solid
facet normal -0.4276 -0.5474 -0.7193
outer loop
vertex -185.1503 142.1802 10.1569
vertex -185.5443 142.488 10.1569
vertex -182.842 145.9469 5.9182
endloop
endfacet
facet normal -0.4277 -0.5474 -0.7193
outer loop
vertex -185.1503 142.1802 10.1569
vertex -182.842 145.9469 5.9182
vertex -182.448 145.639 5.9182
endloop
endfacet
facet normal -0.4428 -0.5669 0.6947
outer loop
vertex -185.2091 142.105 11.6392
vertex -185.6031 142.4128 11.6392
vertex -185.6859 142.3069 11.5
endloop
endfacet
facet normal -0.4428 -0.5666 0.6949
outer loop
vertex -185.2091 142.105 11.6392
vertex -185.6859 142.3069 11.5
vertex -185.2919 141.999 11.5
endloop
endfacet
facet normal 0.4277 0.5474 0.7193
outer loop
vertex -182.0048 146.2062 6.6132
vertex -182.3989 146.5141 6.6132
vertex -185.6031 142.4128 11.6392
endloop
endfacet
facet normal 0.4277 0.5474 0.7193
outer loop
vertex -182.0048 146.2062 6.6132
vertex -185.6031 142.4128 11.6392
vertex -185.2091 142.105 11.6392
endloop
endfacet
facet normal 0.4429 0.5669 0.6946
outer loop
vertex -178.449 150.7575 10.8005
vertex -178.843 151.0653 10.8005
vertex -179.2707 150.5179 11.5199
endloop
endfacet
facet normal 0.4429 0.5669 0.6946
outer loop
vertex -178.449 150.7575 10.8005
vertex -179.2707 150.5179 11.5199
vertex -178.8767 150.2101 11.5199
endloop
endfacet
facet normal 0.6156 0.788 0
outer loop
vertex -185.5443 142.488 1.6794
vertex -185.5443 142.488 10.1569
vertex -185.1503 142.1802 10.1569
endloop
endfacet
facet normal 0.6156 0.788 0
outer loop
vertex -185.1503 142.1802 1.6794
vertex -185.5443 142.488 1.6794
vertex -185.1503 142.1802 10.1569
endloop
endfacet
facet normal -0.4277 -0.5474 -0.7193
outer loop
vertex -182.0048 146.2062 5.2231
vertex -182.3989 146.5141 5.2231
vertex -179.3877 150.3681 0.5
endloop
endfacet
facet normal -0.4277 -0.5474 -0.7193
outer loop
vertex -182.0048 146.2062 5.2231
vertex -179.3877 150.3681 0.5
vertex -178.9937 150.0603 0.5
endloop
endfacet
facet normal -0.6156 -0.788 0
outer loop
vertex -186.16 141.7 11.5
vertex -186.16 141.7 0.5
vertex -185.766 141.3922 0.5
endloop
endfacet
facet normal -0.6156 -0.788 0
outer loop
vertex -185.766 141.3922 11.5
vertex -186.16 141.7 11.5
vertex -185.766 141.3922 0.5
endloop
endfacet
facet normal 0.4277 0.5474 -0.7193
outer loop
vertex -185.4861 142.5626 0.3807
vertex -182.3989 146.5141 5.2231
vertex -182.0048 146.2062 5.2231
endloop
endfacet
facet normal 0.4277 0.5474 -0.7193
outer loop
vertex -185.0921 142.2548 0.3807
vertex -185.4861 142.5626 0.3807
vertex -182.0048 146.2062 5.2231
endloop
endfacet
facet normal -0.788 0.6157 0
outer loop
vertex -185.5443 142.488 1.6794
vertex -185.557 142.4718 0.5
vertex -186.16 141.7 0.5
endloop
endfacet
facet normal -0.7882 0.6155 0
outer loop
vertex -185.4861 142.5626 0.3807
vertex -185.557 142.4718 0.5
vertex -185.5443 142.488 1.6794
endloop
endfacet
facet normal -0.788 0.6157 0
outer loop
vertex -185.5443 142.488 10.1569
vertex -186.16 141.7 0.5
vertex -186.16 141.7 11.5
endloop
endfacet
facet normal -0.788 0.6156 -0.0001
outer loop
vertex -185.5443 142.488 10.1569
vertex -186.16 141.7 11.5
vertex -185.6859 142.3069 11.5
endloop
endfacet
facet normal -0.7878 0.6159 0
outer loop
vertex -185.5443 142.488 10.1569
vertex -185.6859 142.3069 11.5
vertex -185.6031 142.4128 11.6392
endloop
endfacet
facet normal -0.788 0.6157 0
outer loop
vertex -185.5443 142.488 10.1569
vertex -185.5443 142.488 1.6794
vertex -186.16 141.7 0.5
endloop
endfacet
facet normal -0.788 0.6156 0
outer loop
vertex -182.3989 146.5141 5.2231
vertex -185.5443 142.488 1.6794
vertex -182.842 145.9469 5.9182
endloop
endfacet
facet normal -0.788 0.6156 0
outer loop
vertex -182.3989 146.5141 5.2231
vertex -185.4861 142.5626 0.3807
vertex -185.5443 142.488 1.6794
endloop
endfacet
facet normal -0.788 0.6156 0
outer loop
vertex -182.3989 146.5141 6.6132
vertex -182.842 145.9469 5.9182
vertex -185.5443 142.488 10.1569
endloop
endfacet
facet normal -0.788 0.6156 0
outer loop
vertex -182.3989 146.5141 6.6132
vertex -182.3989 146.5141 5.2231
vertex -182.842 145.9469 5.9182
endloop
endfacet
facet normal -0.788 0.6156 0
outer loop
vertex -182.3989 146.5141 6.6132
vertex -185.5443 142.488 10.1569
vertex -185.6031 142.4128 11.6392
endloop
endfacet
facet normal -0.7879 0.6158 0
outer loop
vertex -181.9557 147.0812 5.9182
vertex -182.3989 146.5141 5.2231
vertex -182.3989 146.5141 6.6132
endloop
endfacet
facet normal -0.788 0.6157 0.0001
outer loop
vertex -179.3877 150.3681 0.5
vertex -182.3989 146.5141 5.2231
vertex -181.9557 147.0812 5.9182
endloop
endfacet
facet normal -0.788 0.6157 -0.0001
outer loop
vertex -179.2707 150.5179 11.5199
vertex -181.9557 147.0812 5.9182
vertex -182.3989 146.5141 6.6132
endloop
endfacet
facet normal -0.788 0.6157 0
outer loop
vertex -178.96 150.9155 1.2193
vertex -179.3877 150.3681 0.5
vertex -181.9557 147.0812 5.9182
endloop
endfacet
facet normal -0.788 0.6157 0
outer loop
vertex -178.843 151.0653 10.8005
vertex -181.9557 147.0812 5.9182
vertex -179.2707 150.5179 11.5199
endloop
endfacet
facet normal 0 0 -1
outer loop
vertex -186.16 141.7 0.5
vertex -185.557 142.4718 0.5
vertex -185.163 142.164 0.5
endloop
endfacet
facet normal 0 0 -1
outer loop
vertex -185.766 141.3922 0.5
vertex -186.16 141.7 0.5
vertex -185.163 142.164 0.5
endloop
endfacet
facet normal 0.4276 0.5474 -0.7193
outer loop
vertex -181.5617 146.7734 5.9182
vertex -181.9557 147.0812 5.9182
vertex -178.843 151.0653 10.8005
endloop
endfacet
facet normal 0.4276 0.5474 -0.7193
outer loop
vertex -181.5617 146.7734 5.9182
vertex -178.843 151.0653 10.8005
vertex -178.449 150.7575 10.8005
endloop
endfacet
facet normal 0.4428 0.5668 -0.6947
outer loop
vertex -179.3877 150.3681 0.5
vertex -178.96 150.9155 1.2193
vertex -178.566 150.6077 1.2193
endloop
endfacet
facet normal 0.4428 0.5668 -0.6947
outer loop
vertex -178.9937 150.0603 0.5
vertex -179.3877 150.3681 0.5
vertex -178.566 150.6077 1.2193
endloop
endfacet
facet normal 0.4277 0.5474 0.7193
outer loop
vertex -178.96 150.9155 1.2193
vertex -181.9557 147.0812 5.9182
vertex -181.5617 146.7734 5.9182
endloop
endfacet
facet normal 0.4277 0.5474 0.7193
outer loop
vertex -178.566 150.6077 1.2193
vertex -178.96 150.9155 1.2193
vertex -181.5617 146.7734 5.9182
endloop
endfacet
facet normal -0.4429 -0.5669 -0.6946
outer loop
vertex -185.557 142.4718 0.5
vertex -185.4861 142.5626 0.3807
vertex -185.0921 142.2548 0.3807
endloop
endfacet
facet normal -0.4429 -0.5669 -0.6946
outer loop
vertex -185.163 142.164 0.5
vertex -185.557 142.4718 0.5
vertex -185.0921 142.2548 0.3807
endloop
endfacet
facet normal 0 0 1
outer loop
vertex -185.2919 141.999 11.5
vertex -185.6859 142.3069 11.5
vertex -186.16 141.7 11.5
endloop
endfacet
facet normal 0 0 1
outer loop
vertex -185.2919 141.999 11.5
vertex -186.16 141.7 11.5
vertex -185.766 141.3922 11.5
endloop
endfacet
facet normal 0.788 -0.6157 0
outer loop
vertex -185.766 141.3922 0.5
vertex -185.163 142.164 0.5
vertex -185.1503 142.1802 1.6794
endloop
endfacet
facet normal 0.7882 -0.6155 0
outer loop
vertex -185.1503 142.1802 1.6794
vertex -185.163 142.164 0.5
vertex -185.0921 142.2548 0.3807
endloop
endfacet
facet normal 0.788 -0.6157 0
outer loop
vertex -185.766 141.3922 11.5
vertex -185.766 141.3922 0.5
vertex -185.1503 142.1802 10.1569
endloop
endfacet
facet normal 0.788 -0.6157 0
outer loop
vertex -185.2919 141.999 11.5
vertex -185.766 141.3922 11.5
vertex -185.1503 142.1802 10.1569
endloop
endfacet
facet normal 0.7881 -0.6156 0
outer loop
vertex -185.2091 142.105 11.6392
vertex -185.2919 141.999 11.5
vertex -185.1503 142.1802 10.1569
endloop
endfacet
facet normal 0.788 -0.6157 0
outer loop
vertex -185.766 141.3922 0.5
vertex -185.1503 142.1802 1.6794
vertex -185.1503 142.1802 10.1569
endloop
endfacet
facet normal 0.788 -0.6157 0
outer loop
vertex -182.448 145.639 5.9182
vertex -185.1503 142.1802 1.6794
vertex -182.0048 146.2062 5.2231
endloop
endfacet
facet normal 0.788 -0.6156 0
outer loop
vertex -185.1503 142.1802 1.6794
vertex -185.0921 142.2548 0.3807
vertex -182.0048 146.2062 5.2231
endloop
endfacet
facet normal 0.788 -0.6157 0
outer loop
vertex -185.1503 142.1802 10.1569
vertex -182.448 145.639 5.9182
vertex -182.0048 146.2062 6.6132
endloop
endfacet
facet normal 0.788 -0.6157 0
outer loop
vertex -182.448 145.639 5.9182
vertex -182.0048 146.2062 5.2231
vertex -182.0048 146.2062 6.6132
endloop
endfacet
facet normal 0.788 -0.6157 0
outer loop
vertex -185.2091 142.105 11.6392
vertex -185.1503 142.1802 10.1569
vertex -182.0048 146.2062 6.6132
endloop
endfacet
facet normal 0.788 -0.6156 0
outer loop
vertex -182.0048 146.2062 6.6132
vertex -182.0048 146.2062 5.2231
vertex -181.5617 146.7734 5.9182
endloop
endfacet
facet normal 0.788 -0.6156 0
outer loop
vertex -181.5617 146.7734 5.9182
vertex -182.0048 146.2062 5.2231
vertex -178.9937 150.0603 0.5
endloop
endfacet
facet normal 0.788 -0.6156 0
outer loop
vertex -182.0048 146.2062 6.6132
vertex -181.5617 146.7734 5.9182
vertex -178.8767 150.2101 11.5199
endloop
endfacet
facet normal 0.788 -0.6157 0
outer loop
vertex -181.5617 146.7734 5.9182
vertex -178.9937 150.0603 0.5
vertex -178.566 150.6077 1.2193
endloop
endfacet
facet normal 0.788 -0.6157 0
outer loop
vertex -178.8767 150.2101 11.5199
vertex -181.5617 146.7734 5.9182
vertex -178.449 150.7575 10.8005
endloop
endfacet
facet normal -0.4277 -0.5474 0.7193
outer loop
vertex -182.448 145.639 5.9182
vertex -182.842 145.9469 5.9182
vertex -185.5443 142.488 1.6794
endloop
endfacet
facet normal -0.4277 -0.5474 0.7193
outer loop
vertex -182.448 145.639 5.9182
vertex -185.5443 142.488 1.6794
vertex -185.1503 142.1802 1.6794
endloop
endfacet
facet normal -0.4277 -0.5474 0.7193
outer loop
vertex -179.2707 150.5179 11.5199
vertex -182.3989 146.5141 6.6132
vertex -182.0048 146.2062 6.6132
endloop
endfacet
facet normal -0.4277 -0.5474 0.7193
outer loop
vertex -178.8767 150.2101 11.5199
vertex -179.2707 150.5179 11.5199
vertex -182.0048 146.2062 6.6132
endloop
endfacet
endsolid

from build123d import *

# Parameters (mm, degrees)
BOX235_W                  = 0.5
BOX235_H                  = 1
BOX235_DEPTH              = 15
BOX235_ROLL_ANGLE         = 46
BOX236_W                  = 0.5
BOX236_H                  = 1
BOX236_DEPTH              = 15
BOX236_ROLL_ANGLE         = -46
BOX234_W                  = 0.5
BOX234_H                  = 1
BOX234_DEPTH              = 11
FUSION021_PLACEMENT_ANGLE = -38


with BuildPart() as cubo235:
    # Box235 → Box235 (new body)
    with BuildSketch(Plane.XY):
        with Locations((0.25, 0.5)):
            Rectangle(BOX235_W, BOX235_H)
    extrude(amount=BOX235_DEPTH)


with BuildPart() as cubo235_1:
    # Box235 roll: moved
    add(cubo235.part.rotate(Axis((0, 0, 0), (1, 0, 0)), BOX235_ROLL_ANGLE))


with BuildPart() as cubo235_2:
    # Box235 placement: moved
    add(cubo235_1.part.moved(Location((0, 11, 0.5))))


with BuildPart() as cubo236:
    # Box236 → Box236 (new body)
    with BuildSketch(Plane.XY):
        with Locations((0.25, 0.5)):
            Rectangle(BOX236_W, BOX236_H)
    extrude(amount=BOX236_DEPTH)


with BuildPart() as cubo236_1:
    # Box236 roll: moved
    add(cubo236.part.rotate(Axis((0, 0, 0), (1, 0, 0)), BOX236_ROLL_ANGLE))


with BuildPart() as cubo236_2:
    # Box236 placement: moved
    add(cubo236_1.part.moved(Location((0, 0.4, 1.1))))


with BuildPart() as fusion021:
    # Box234 → Box234 (new body)
    with BuildSketch(Plane.XY.offset(0.5)):
        with Locations((0.25, 0.5)):
            Rectangle(BOX234_W, BOX234_H)
    extrude(amount=BOX234_DEPTH)

    # Fusion021: union Cubo235, Cubo236
    add(cubo235_2.part)
    add(cubo236_2.part)


with BuildPart() as fusion021_1:
    # Fusion021 placement: moved
    add(fusion021.part.moved(Location((-186.16, 141.7, 0))).rotate(Axis((-186.16, 141.7, 0), (0, 0, 1)), FUSION021_PLACEMENT_ANGLE))


solid = fusion021_1.part
